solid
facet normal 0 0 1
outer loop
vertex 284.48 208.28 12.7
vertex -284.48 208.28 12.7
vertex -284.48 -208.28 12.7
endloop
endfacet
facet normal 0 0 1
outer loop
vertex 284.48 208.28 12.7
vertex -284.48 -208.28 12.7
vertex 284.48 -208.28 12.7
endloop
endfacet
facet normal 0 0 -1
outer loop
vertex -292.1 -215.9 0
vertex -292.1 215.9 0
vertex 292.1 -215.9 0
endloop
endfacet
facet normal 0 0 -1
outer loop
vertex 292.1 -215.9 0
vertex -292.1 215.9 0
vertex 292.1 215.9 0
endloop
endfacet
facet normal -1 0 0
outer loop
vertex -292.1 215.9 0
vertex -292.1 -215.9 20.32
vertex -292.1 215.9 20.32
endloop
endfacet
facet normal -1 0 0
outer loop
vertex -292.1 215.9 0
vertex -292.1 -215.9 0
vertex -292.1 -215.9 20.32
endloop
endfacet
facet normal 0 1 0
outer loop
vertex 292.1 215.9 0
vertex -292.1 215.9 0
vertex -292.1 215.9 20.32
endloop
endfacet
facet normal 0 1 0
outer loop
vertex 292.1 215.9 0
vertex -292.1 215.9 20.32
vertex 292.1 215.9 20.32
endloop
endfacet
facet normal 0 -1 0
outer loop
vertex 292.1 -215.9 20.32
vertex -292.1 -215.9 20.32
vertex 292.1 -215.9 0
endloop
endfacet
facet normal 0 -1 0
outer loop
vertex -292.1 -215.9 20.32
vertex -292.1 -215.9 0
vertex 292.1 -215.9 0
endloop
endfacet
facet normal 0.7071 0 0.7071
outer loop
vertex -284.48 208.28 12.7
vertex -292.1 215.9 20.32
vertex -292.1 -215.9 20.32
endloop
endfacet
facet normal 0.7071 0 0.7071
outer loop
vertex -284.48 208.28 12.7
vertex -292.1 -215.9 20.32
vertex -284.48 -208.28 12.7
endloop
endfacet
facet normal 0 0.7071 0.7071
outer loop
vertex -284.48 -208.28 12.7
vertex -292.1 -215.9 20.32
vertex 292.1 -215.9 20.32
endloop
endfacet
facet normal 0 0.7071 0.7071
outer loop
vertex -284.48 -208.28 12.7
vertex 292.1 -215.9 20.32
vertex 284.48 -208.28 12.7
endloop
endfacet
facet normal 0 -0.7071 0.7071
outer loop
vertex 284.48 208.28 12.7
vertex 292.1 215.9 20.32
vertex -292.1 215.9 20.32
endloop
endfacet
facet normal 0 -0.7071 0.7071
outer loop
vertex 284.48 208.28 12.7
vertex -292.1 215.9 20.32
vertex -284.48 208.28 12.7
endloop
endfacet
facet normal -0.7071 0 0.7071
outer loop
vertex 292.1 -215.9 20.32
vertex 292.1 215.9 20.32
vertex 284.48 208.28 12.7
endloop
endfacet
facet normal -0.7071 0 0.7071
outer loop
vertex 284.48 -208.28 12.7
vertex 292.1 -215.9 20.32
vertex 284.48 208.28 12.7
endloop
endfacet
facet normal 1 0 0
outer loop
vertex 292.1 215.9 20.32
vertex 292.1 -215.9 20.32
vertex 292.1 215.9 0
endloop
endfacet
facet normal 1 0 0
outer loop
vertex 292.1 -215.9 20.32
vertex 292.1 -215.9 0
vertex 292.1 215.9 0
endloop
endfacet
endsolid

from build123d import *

# Parameters (mm, degrees)
F0_W         = 584.2
F0_H         = 431.8
F1_DEPTH     = 12.7
F2_W         = 584.2
F2_H         = 431.8
F2_W_2       = 558.8
F2_H_2       = 406.4
F3_DEPTH     = 7.62
F4_T4_DEPTH  = 558.8
F4_T9_DEPTH  = 406.4
F4_T14_DEPTH = 558.8
F4_T19_DEPTH = 406.4
F4_T25_DEPTH = 439.0603739472
F4_T31_DEPTH = 591.4603739472
F4_T40_DEPTH = 591.4603739472
F4_T46_DEPTH = 439.0603739472
F4_T55_DEPTH = 439.0603739472
F4_T61_DEPTH = 591.4603739472
F4_T70_DEPTH = 439.0603739472
F4_T76_DEPTH = 591.4603739472


# Not quite as in the source:
# - a fillet or chamfer that OpenCascade refuses, or shapes differently, is made with other operations: its cross-section is extruded or revolved along the edge and cut away or added


with BuildPart() as f1:
    # F0 (on Top) → F1 (new body)
    with BuildSketch(Plane.XY):
        Rectangle(F0_W, F0_H)
    extrude(amount=F1_DEPTH)

    # F2 (on face) → F3 (join)
    with BuildSketch(Plane.XY.offset(12.7)):
        Rectangle(F2_W, F2_H)
        Rectangle(F2_W_2, F2_H_2, mode=Mode.SUBTRACT)
    extrude(amount=F3_DEPTH)

    # F4: chamfer of 12.7 on 4 edges, made by hand


with BuildPart() as f4_tool2:
    # F4_s3 → F4_t4 (new body)
    with BuildSketch(Plane.YZ.offset(-279.4)):
        Polygon((215.9, 20.32), (203.2, 7.62), (203.2, 20.32), align=None)
    extrude(amount=F4_T4_DEPTH)

    split(bisect_by=Plane.XY.offset(12.7), keep=Keep.TOP)


with BuildPart() as f1_1:
    add(f1.part)

    # F4_t1: cut F4_tool2
    add(f4_tool2.part, mode=Mode.SUBTRACT)


with BuildPart() as f4_tool7:
    # F4_s8 → F4_t9 (new body)
    with BuildSketch(Plane.XZ.offset(-203.2)):
        Polygon((292.1, 20.32), (279.4, 7.62), (279.4, 20.32), align=None)
    extrude(amount=F4_T9_DEPTH)

    split(bisect_by=Plane.XY.offset(12.7), keep=Keep.TOP)


with BuildPart() as f1_2:
    add(f1_1.part)

    # F4_t6: cut F4_tool7
    add(f4_tool7.part, mode=Mode.SUBTRACT)


with BuildPart() as f4_tool12:
    # F4_s13 → F4_t14 (new body)
    with BuildSketch(Plane.YZ.offset(279.4)):
        Polygon((-215.9, 20.32), (-203.2, 7.62), (-203.2, 20.32), align=None)
    extrude(amount=-F4_T14_DEPTH)

    split(bisect_by=Plane.XY.offset(12.7), keep=Keep.TOP)


with BuildPart() as f1_3:
    add(f1_2.part)

    # F4_t11: cut F4_tool12
    add(f4_tool12.part, mode=Mode.SUBTRACT)


with BuildPart() as f4_tool17:
    # F4_s18 → F4_t19 (new body)
    with BuildSketch(Plane.XZ.offset(203.2)):
        Polygon((-292.1, 20.32), (-279.4, 7.62), (-279.4, 20.32), align=None)
    extrude(amount=-F4_T19_DEPTH)

    split(bisect_by=Plane.XY.offset(12.7), keep=Keep.TOP)


with BuildPart() as f1_4:
    add(f1_3.part)

    # F4_t16: cut F4_tool17
    add(f4_tool17.part, mode=Mode.SUBTRACT)


with BuildPart() as f4_tool23:
    # F4_s24 → F4_t25 (new body)
    with BuildSketch(Plane.XZ.offset(203.2)):
        Polygon((-292.1, 20.32), (-279.4, 7.62), (-279.4, 20.32), align=None)
    extrude(amount=-F4_T25_DEPTH)

    split(bisect_by=Plane.XZ.offset(-215.9), keep=Keep.TOP)

    split(bisect_by=Plane.XY.offset(12.7), keep=Keep.TOP)

    split(bisect_by=Plane.XZ.offset(-203.2), keep=Keep.BOTTOM)


with BuildPart() as f4_tool29:
    # F4_s30 → F4_t31 (new body)
    with BuildSketch(Plane.YZ.offset(-312.0603739472)):
        Polygon((215.9, 20.32), (203.2, 7.62), (203.2, 20.32), align=None)
    extrude(amount=F4_T31_DEPTH)

    split(bisect_by=Plane.XY.offset(12.7), keep=Keep.TOP)

    split(bisect_by=Plane.YZ.offset(-279.4), keep=Keep.BOTTOM)

    split(bisect_by=Plane.YZ.offset(-292.1), keep=Keep.TOP)


with BuildPart() as f4_tool23_1:
    add(f4_tool23.part)

    # F4_t35: intersect F4_tool29
    add(f4_tool29.part, mode=Mode.INTERSECT)


with BuildPart() as f1_5:
    add(f1_4.part)

    # F4_t21: cut F4_tool23
    add(f4_tool23_1.part, mode=Mode.SUBTRACT)


with BuildPart() as f4_tool38:
    # F4_s39 → F4_t40 (new body)
    with BuildSketch(Plane.YZ.offset(-279.4)):
        Polygon((215.9, 20.32), (203.2, 7.62), (203.2, 20.32), align=None)
    extrude(amount=F4_T40_DEPTH)

    split(bisect_by=Plane.YZ.offset(292.1), keep=Keep.BOTTOM)

    split(bisect_by=Plane.XY.offset(12.7), keep=Keep.TOP)

    split(bisect_by=Plane.YZ.offset(279.4), keep=Keep.TOP)


with BuildPart() as f4_tool44:
    # F4_s45 → F4_t46 (new body)
    with BuildSketch(Plane.XZ.offset(-235.8603739472)):
        Polygon((292.1, 20.32), (279.4, 7.62), (279.4, 20.32), align=None)
    extrude(amount=F4_T46_DEPTH)

    split(bisect_by=Plane.XZ.offset(-215.9), keep=Keep.TOP)

    split(bisect_by=Plane.XY.offset(12.7), keep=Keep.TOP)

    split(bisect_by=Plane.XZ.offset(-203.2), keep=Keep.BOTTOM)


with BuildPart() as f4_tool38_1:
    add(f4_tool38.part)

    # F4_t50: intersect F4_tool44
    add(f4_tool44.part, mode=Mode.INTERSECT)


with BuildPart() as f1_6:
    add(f1_5.part)

    # F4_t36: cut F4_tool38
    add(f4_tool38_1.part, mode=Mode.SUBTRACT)


with BuildPart() as f4_tool53:
    # F4_s54 → F4_t55 (new body)
    with BuildSketch(Plane.XZ.offset(-203.2)):
        Polygon((292.1, 20.32), (279.4, 7.62), (279.4, 20.32), align=None)
    extrude(amount=F4_T55_DEPTH)

    split(bisect_by=Plane.XZ.offset(215.9), keep=Keep.BOTTOM)

    split(bisect_by=Plane.XZ.offset(203.2), keep=Keep.TOP)

    split(bisect_by=Plane.XY.offset(12.7), keep=Keep.TOP)


with BuildPart() as f4_tool59:
    # F4_s60 → F4_t61 (new body)
    with BuildSketch(Plane.YZ.offset(312.0603739472)):
        Polygon((-215.9, 20.32), (-203.2, 7.62), (-203.2, 20.32), align=None)
    extrude(amount=-F4_T61_DEPTH)

    split(bisect_by=Plane.YZ.offset(292.1), keep=Keep.BOTTOM)

    split(bisect_by=Plane.XY.offset(12.7), keep=Keep.TOP)

    split(bisect_by=Plane.YZ.offset(279.4), keep=Keep.TOP)


with BuildPart() as f4_tool53_1:
    add(f4_tool53.part)

    # F4_t65: intersect F4_tool59
    add(f4_tool59.part, mode=Mode.INTERSECT)


with BuildPart() as f1_7:
    add(f1_6.part)

    # F4_t51: cut F4_tool53
    add(f4_tool53_1.part, mode=Mode.SUBTRACT)


with BuildPart() as f4_tool68:
    # F4_s69 → F4_t70 (new body)
    with BuildSketch(Plane.XZ.offset(235.8603739472)):
        Polygon((-292.1, 20.32), (-279.4, 7.62), (-279.4, 20.32), align=None)
    extrude(amount=-F4_T70_DEPTH)

    split(bisect_by=Plane.XZ.offset(215.9), keep=Keep.BOTTOM)

    split(bisect_by=Plane.XZ.offset(203.2), keep=Keep.TOP)

    split(bisect_by=Plane.XY.offset(12.7), keep=Keep.TOP)


with BuildPart() as f4_tool74:
    # F4_s75 → F4_t76 (new body)
    with BuildSketch(Plane.YZ.offset(279.4)):
        Polygon((-215.9, 20.32), (-203.2, 7.62), (-203.2, 20.32), align=None)
    extrude(amount=-F4_T76_DEPTH)

    split(bisect_by=Plane.XY.offset(12.7), keep=Keep.TOP)

    split(bisect_by=Plane.YZ.offset(-279.4), keep=Keep.BOTTOM)

    split(bisect_by=Plane.YZ.offset(-292.1), keep=Keep.TOP)


with BuildPart() as f4_tool68_1:
    add(f4_tool68.part)

    # F4_t80: intersect F4_tool74
    add(f4_tool74.part, mode=Mode.INTERSECT)


with BuildPart() as f1_8:
    add(f1_7.part)

    # F4_t66: cut F4_tool68
    add(f4_tool68_1.part, mode=Mode.SUBTRACT)


solid = f1_8.part
